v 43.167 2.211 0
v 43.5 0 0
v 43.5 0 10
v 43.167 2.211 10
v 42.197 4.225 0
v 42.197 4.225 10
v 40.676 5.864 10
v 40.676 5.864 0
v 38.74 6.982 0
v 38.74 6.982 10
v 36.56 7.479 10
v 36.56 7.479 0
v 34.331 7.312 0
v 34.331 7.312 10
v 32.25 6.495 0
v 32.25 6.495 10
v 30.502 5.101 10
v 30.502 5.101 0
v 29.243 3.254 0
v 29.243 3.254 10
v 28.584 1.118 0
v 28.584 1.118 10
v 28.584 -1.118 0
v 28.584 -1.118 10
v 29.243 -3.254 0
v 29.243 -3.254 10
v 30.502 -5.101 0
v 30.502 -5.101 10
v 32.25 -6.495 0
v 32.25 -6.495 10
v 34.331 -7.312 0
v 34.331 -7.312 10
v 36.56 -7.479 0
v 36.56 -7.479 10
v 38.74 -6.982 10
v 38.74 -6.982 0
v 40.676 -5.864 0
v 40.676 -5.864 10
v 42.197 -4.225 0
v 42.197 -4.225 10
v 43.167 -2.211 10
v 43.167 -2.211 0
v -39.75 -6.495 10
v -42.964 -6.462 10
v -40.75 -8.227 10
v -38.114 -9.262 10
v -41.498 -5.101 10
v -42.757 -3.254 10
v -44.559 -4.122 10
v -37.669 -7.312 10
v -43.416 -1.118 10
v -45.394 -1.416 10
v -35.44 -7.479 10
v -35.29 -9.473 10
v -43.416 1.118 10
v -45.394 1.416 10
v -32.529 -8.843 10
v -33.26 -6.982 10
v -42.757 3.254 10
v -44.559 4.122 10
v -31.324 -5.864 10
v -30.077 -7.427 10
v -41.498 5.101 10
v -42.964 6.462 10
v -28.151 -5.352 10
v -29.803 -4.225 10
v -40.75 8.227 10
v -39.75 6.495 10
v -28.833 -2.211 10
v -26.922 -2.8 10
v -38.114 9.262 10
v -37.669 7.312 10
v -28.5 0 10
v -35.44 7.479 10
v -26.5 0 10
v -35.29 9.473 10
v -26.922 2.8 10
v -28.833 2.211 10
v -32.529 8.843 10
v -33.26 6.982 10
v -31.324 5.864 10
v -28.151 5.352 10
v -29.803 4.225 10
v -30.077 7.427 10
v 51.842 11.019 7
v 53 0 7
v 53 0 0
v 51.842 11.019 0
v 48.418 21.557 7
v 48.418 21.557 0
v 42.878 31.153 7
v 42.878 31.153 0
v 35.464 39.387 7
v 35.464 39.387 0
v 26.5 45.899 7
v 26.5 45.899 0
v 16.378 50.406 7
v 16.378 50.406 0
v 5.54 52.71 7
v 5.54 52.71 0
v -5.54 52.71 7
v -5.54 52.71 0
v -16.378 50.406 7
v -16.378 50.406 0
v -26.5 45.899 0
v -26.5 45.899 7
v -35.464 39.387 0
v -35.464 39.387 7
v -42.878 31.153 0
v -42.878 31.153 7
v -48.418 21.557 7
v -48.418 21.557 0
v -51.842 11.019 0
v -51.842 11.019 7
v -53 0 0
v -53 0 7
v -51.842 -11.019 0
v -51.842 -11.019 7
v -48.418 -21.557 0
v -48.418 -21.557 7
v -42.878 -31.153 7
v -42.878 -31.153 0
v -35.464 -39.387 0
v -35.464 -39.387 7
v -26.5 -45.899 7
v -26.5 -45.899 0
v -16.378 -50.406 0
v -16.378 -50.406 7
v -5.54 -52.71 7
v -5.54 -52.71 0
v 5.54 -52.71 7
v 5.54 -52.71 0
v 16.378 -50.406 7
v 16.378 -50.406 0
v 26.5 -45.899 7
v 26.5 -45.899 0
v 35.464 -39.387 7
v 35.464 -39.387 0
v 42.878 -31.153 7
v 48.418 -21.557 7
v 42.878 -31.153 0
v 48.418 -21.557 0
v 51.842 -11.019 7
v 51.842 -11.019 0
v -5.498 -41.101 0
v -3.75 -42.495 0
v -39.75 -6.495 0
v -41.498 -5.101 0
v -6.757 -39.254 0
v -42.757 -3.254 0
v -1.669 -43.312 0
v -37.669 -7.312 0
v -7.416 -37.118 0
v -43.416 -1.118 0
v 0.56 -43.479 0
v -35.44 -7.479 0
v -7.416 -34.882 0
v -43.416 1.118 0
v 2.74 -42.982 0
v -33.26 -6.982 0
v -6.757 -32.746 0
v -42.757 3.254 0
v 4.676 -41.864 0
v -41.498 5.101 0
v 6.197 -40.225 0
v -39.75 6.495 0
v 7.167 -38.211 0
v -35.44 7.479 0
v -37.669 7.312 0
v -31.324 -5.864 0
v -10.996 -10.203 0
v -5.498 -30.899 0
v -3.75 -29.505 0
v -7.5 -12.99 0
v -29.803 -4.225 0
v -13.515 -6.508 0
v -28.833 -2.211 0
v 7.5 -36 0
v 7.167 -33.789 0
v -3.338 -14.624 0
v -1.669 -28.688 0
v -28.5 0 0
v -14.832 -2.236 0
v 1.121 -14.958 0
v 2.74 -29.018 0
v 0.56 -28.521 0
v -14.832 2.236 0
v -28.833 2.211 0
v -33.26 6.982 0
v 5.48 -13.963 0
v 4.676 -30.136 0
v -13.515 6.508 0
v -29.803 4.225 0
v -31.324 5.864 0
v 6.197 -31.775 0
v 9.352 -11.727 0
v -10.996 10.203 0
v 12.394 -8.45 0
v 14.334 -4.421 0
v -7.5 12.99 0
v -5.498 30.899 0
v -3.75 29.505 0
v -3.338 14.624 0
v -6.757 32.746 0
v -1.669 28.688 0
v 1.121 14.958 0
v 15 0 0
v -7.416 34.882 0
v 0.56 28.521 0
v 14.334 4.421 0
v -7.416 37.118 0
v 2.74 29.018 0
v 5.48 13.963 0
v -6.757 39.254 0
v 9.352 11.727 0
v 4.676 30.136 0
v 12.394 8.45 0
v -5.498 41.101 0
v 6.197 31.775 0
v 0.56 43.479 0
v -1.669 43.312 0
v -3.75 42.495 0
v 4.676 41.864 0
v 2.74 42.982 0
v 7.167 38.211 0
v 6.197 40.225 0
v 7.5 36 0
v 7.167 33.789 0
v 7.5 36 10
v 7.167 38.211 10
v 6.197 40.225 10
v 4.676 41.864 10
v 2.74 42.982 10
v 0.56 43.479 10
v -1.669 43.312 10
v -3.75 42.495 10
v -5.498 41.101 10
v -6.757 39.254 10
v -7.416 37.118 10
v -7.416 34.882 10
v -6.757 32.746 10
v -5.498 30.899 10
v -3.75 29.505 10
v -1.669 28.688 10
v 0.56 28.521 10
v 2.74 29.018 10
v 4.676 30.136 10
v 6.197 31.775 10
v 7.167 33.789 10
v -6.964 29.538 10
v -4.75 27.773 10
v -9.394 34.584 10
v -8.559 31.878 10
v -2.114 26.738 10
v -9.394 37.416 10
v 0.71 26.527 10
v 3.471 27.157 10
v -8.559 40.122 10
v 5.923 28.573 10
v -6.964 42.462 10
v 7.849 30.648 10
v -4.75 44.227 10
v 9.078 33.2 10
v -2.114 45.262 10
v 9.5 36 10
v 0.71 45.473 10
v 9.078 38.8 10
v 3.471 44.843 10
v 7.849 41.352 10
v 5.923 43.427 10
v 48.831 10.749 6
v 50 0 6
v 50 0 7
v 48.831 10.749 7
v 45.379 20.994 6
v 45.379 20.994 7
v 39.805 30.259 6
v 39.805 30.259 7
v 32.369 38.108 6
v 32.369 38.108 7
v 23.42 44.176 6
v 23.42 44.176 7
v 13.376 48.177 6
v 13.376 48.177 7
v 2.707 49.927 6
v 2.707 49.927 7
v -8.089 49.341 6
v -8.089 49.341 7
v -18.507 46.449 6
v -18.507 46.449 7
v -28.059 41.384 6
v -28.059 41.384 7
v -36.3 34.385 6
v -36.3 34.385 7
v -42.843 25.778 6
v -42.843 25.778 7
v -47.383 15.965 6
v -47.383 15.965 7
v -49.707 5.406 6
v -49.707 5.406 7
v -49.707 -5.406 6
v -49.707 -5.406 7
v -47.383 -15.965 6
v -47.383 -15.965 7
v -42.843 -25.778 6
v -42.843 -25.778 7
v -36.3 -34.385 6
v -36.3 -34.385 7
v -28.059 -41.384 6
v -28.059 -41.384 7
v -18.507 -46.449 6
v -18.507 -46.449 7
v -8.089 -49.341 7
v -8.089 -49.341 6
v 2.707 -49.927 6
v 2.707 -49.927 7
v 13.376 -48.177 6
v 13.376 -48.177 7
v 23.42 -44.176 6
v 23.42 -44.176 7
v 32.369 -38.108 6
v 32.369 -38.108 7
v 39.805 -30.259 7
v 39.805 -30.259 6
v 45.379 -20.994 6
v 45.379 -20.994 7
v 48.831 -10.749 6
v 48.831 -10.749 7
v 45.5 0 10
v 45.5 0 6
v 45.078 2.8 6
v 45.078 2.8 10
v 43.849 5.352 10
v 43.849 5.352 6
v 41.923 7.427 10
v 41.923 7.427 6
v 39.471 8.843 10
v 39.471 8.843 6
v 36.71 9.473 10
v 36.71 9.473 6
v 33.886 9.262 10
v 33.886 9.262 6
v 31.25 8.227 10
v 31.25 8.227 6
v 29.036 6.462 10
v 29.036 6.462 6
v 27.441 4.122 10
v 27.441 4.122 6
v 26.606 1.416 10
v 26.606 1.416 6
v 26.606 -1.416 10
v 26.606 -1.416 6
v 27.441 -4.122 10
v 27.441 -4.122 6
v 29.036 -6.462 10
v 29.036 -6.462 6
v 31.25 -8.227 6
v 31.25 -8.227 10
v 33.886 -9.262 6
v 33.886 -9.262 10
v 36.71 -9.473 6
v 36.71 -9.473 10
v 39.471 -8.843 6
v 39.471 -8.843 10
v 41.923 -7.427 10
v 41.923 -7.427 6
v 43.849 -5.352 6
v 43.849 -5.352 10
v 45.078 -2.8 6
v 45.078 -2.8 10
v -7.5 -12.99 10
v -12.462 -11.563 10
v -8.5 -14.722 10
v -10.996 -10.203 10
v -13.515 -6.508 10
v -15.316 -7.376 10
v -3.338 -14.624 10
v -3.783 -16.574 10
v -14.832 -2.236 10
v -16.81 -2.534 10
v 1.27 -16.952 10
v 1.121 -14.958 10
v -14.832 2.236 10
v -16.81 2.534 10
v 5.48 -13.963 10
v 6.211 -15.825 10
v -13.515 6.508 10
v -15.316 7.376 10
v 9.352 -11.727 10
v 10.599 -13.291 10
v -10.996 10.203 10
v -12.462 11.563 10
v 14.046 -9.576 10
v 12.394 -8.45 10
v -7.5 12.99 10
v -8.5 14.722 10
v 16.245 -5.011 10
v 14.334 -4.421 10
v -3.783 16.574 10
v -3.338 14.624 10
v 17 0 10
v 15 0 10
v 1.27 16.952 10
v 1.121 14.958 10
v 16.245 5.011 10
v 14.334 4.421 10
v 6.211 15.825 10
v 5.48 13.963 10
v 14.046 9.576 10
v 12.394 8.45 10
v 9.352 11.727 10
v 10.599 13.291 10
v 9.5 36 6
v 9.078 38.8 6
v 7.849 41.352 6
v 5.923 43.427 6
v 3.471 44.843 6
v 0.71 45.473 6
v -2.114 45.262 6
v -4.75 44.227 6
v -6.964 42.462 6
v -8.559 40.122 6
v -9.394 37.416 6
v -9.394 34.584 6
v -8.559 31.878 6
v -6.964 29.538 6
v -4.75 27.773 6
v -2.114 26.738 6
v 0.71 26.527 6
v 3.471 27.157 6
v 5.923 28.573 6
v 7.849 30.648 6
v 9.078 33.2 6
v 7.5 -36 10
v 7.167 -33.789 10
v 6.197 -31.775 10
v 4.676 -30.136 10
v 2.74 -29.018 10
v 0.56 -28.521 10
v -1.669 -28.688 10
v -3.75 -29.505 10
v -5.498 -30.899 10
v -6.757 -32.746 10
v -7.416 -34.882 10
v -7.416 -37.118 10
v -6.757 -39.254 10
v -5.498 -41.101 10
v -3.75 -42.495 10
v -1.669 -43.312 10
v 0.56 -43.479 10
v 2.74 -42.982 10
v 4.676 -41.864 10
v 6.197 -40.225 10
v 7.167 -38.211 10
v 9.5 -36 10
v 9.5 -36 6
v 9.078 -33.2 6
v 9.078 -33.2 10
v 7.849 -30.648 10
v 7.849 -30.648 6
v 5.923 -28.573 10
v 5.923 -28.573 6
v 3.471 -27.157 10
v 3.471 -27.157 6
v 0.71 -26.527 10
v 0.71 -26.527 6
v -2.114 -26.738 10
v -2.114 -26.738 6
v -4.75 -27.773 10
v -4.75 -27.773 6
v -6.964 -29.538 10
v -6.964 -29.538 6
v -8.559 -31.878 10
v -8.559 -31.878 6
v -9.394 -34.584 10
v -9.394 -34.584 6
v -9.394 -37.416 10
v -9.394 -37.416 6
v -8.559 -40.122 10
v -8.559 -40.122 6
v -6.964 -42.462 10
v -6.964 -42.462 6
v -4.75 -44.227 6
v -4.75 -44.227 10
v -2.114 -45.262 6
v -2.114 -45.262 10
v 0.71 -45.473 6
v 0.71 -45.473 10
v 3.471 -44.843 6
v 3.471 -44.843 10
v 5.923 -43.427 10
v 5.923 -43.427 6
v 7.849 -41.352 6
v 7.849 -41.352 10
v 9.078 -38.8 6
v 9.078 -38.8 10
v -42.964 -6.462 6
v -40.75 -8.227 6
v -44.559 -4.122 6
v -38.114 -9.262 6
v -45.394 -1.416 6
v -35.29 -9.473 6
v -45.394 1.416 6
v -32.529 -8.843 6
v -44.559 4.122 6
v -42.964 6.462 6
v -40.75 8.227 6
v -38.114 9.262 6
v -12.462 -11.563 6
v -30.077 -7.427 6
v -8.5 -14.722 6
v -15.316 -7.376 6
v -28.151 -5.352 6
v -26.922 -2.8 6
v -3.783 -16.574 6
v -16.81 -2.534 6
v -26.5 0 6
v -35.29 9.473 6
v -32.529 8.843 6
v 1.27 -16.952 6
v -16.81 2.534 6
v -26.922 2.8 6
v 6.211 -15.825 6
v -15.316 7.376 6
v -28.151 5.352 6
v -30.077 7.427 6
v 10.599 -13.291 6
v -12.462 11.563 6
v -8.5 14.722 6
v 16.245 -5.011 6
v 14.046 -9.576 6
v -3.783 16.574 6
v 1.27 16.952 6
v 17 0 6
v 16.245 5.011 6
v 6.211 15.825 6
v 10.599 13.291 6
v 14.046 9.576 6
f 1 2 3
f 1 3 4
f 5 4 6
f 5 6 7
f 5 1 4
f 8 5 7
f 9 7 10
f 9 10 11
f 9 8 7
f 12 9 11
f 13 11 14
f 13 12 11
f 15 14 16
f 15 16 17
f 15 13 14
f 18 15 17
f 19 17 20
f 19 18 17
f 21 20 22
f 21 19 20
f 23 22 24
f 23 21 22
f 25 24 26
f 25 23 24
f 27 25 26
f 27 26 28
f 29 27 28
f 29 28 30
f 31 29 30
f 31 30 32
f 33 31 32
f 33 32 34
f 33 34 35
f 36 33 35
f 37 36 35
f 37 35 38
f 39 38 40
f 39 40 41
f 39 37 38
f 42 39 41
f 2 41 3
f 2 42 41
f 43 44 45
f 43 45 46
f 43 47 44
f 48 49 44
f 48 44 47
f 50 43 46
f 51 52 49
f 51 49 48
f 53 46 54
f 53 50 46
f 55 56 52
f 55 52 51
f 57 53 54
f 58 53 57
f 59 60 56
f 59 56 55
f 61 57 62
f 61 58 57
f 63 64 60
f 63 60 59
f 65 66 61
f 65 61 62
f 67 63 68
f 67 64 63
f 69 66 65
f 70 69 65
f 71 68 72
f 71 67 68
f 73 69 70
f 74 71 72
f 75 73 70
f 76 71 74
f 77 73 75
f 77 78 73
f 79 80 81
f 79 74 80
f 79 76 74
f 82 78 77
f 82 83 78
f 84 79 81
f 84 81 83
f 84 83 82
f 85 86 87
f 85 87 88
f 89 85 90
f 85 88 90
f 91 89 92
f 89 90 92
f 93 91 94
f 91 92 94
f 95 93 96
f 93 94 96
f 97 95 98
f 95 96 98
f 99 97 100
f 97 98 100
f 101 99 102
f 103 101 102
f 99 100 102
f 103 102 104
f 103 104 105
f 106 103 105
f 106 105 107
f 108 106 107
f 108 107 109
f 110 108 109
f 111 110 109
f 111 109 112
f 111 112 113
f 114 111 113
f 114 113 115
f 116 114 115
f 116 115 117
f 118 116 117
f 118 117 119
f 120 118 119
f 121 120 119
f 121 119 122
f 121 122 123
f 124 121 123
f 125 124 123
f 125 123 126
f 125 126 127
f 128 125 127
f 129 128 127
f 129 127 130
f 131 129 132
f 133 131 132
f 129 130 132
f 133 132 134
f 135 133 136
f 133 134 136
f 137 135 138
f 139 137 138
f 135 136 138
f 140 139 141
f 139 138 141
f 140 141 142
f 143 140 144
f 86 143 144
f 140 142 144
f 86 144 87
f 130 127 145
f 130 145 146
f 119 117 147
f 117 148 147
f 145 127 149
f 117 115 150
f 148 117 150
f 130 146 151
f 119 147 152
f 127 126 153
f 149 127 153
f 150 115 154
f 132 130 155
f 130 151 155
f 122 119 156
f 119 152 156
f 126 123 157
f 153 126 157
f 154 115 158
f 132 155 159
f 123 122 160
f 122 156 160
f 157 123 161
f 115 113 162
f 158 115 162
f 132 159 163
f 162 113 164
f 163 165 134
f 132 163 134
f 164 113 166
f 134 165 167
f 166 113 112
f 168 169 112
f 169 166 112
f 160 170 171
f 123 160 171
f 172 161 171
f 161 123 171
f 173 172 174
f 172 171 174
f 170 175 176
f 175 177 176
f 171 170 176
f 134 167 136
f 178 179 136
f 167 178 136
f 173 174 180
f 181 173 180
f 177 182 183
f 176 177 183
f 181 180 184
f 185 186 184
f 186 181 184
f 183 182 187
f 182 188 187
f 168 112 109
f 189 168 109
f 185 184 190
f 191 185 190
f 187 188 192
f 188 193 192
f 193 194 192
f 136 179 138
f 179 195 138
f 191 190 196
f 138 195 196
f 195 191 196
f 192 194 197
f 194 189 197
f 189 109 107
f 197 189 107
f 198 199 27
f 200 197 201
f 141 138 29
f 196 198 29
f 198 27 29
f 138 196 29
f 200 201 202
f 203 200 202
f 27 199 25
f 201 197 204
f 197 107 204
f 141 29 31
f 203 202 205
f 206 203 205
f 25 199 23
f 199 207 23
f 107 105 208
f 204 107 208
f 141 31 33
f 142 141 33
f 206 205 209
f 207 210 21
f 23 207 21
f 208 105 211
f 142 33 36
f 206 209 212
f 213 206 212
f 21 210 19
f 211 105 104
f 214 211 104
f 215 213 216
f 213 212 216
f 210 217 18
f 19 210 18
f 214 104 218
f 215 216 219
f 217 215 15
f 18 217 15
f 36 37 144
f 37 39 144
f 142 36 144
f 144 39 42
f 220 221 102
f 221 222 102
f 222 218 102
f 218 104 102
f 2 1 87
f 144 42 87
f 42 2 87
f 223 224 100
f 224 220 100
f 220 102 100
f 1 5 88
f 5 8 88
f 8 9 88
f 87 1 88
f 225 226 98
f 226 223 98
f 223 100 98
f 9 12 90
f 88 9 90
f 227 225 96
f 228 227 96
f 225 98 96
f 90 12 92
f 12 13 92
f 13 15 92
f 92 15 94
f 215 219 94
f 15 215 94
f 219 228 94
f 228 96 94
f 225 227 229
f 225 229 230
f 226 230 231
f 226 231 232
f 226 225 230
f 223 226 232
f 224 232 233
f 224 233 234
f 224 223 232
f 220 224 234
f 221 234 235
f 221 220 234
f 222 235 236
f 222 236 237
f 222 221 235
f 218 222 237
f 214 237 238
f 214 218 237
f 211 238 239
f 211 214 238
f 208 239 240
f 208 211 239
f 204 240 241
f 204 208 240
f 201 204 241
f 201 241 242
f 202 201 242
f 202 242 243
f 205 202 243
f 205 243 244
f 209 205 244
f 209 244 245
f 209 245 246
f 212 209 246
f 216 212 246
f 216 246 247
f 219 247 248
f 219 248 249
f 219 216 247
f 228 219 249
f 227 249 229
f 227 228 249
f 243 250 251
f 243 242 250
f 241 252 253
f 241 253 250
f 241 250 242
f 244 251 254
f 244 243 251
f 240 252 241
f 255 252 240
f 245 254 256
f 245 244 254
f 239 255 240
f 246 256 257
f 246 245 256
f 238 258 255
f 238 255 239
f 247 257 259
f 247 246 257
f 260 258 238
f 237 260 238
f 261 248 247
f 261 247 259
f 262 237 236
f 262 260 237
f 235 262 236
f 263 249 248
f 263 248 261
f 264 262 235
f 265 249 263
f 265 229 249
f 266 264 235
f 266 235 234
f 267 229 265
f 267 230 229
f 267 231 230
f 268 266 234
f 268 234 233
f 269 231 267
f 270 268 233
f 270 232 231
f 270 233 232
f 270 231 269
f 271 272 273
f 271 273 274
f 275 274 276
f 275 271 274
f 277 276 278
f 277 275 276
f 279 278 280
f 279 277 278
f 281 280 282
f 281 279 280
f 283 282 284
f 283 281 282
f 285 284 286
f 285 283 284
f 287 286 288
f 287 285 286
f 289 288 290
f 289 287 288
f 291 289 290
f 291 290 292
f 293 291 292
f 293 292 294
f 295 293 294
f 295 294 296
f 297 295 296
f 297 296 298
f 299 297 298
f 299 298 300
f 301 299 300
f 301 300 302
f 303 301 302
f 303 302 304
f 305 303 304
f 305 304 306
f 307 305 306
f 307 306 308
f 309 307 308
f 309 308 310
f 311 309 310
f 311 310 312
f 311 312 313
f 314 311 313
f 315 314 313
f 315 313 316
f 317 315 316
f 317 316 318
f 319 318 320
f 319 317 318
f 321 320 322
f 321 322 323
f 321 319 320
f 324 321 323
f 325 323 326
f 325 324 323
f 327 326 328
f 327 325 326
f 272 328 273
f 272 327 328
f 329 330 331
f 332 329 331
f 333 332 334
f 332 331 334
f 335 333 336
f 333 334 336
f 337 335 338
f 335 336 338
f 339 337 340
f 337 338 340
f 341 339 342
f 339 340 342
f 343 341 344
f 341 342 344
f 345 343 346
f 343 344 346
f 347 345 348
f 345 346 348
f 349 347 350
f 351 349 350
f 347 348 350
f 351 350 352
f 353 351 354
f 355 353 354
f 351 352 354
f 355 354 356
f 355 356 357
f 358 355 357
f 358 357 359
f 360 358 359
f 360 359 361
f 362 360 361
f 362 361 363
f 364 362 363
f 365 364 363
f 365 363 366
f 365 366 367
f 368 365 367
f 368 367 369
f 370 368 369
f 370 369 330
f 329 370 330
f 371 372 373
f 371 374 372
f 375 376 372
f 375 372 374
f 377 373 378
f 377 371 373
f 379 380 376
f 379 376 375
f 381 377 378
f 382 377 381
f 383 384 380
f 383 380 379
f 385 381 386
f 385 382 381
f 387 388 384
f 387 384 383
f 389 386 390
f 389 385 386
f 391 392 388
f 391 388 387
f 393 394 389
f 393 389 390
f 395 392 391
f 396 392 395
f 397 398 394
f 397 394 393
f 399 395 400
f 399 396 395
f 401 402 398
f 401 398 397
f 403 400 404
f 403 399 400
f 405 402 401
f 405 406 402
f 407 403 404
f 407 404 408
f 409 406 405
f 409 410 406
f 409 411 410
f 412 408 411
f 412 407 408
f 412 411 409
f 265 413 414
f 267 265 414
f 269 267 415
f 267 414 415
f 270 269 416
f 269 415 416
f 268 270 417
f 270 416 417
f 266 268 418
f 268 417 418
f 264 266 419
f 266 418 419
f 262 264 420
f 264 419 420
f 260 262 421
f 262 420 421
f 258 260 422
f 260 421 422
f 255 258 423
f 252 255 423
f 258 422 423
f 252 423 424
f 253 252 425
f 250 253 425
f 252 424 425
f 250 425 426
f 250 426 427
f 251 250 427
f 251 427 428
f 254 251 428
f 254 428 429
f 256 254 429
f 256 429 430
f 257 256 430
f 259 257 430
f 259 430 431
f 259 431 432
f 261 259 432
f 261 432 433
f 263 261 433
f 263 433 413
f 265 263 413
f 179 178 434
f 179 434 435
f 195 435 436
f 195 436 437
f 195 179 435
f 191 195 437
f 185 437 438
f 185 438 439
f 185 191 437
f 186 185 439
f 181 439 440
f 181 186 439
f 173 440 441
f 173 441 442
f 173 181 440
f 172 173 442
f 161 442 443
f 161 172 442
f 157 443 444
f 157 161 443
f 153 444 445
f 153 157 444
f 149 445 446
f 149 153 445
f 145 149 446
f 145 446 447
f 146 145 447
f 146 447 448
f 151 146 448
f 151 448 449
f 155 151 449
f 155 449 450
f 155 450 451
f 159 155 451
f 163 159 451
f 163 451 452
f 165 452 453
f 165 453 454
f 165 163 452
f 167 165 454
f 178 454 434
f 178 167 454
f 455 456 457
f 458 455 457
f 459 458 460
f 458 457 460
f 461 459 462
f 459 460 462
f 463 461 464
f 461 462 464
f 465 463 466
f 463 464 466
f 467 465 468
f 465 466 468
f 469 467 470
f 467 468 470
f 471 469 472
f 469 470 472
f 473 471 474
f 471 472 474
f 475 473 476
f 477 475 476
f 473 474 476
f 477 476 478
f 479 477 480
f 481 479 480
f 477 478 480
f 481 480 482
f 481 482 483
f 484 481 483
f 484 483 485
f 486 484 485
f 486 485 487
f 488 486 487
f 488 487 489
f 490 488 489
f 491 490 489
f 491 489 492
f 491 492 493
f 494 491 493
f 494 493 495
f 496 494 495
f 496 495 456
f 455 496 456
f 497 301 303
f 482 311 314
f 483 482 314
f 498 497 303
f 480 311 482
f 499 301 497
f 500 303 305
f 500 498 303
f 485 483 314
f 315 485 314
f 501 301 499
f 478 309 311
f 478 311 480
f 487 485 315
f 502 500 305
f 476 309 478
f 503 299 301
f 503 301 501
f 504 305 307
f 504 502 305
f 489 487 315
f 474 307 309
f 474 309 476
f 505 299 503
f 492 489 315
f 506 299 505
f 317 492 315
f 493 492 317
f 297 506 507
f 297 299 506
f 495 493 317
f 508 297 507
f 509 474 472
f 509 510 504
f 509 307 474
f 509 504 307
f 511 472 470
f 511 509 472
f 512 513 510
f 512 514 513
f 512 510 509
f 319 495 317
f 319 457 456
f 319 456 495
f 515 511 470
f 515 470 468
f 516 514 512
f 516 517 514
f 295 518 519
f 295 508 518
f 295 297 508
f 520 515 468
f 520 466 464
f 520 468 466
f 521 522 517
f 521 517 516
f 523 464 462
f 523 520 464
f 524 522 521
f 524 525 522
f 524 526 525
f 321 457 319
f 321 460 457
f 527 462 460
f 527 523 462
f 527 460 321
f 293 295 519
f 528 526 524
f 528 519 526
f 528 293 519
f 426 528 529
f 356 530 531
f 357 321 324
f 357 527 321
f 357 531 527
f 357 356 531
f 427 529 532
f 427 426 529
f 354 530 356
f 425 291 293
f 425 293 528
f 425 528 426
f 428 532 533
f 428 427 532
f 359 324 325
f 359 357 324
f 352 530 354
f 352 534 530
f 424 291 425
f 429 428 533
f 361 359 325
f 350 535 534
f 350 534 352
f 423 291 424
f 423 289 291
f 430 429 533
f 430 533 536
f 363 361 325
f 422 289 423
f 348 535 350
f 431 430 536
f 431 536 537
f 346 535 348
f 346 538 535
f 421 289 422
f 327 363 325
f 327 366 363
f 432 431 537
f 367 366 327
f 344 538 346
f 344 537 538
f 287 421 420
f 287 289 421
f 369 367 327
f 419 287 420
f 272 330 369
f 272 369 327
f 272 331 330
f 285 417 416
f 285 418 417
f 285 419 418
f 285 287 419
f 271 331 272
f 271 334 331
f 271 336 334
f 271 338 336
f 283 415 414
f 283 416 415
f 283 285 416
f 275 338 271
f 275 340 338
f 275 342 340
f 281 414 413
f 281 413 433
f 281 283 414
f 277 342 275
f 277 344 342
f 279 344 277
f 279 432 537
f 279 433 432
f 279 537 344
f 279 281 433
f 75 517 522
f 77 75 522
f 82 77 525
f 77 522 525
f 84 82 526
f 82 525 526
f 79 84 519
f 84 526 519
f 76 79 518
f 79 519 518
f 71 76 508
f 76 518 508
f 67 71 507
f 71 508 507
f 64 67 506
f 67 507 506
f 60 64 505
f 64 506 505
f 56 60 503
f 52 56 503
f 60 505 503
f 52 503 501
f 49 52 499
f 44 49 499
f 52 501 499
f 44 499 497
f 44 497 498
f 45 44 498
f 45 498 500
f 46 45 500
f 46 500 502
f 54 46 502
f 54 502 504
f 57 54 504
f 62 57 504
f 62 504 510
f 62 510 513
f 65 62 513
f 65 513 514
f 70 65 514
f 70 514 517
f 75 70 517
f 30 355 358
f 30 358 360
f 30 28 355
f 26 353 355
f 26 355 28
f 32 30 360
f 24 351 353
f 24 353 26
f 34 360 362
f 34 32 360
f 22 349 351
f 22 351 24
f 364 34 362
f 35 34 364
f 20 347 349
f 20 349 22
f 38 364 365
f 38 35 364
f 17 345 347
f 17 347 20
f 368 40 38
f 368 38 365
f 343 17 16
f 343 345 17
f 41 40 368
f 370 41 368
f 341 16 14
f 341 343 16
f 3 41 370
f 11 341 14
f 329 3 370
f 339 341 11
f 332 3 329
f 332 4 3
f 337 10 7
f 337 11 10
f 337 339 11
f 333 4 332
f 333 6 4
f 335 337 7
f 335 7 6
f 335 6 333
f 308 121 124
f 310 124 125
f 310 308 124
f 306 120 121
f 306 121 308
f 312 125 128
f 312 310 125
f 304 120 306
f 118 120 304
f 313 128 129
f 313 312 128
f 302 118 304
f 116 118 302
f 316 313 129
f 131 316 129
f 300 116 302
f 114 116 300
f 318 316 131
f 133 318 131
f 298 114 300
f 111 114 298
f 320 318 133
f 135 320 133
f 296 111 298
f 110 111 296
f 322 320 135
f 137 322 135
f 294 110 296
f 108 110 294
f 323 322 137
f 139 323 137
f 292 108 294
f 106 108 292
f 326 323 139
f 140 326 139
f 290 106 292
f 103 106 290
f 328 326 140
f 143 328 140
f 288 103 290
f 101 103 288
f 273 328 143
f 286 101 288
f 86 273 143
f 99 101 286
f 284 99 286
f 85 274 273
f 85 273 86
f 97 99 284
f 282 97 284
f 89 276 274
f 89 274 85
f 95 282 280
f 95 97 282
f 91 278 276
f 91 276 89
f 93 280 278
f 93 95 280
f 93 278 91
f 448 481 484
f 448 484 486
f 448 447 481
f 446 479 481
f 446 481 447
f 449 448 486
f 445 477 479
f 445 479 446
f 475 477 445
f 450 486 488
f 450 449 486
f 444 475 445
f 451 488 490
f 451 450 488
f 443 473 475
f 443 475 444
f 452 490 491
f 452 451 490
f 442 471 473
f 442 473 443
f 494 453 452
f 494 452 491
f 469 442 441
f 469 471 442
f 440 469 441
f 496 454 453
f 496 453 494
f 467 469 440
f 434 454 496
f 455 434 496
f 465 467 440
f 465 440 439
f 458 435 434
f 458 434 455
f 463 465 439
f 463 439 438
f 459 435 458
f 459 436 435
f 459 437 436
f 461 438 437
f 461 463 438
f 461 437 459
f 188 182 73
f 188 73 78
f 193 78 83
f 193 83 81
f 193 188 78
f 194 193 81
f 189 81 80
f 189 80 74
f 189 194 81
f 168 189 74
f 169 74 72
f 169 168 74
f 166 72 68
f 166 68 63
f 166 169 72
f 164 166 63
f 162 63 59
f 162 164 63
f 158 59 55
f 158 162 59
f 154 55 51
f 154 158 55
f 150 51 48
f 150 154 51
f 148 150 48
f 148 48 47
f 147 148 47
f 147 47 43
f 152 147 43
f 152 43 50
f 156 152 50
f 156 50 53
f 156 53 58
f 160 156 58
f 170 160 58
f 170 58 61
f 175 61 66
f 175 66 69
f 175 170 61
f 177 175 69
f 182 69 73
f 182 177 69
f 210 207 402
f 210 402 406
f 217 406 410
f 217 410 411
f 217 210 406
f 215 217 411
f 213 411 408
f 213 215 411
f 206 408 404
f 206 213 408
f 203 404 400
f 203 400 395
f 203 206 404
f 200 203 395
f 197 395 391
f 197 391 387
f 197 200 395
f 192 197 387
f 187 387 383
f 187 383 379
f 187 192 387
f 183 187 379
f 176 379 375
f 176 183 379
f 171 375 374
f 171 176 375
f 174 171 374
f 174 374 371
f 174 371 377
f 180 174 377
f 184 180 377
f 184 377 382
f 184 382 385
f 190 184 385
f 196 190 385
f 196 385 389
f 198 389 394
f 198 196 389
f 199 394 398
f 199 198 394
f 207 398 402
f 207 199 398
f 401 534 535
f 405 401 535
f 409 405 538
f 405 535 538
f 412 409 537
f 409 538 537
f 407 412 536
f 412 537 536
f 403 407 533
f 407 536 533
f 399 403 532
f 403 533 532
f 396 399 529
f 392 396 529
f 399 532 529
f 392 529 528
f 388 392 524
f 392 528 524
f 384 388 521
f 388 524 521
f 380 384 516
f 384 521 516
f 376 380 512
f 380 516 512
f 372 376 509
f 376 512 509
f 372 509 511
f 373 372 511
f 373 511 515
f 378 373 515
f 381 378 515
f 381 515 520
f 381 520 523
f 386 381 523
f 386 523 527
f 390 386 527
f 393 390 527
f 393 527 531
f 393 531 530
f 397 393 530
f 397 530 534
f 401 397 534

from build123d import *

# Parameters (mm, degrees)
F0_R     = 53
F0_R_2   = 50
F1_DEPTH = 7
F0_R_3   = 9.5
F0_R_4   = 17
F2_DEPTH = 6
F0_R_5   = 7.5
F0_R_6   = 15
F3_DEPTH = 10


with BuildPart() as f1:
    # F0 (on Top) → F1 (new body)
    with BuildSketch(Plane.XY):
        Circle(F0_R)
        Circle(F0_R_2, mode=Mode.SUBTRACT)
    extrude(amount=F1_DEPTH)

    # F0 (on Top) → F2 (join)
    with BuildSketch(Plane.XY):
        Circle(F0_R)
        Circle(F0_R_2, mode=Mode.SUBTRACT)
        Circle(F0_R_2)
        with Locations((0, -36)):
            Circle(F0_R_3, mode=Mode.SUBTRACT)
        with Locations((-36, 0)):
            Circle(F0_R_3, mode=Mode.SUBTRACT)
        Circle(F0_R_4, mode=Mode.SUBTRACT)
        with Locations((36, 0)):
            Circle(F0_R_3, mode=Mode.SUBTRACT)
        with Locations((0, 36)):
            Circle(F0_R_3, mode=Mode.SUBTRACT)
    extrude(amount=F2_DEPTH)

    # F0 (on Top) → F3 (join)
    with BuildSketch(Plane.XY):
        with Locations((0, 36)):
            Circle(F0_R_3)
        with Locations((0, 36)):
            Circle(F0_R_5, mode=Mode.SUBTRACT)
        with Locations((36, 0)):
            Circle(F0_R_3)
        with Locations((36, 0)):
            Circle(F0_R_5, mode=Mode.SUBTRACT)
        with Locations((-36, 0)):
            Circle(F0_R_3)
        with Locations((-36, 0)):
            Circle(F0_R_5, mode=Mode.SUBTRACT)
        with Locations((0, -36)):
            Circle(F0_R_3)
        with Locations((0, -36)):
            Circle(F0_R_5, mode=Mode.SUBTRACT)
        Circle(F0_R_4)
        Circle(F0_R_6, mode=Mode.SUBTRACT)
    extrude(amount=F3_DEPTH)


solid = f1.part
